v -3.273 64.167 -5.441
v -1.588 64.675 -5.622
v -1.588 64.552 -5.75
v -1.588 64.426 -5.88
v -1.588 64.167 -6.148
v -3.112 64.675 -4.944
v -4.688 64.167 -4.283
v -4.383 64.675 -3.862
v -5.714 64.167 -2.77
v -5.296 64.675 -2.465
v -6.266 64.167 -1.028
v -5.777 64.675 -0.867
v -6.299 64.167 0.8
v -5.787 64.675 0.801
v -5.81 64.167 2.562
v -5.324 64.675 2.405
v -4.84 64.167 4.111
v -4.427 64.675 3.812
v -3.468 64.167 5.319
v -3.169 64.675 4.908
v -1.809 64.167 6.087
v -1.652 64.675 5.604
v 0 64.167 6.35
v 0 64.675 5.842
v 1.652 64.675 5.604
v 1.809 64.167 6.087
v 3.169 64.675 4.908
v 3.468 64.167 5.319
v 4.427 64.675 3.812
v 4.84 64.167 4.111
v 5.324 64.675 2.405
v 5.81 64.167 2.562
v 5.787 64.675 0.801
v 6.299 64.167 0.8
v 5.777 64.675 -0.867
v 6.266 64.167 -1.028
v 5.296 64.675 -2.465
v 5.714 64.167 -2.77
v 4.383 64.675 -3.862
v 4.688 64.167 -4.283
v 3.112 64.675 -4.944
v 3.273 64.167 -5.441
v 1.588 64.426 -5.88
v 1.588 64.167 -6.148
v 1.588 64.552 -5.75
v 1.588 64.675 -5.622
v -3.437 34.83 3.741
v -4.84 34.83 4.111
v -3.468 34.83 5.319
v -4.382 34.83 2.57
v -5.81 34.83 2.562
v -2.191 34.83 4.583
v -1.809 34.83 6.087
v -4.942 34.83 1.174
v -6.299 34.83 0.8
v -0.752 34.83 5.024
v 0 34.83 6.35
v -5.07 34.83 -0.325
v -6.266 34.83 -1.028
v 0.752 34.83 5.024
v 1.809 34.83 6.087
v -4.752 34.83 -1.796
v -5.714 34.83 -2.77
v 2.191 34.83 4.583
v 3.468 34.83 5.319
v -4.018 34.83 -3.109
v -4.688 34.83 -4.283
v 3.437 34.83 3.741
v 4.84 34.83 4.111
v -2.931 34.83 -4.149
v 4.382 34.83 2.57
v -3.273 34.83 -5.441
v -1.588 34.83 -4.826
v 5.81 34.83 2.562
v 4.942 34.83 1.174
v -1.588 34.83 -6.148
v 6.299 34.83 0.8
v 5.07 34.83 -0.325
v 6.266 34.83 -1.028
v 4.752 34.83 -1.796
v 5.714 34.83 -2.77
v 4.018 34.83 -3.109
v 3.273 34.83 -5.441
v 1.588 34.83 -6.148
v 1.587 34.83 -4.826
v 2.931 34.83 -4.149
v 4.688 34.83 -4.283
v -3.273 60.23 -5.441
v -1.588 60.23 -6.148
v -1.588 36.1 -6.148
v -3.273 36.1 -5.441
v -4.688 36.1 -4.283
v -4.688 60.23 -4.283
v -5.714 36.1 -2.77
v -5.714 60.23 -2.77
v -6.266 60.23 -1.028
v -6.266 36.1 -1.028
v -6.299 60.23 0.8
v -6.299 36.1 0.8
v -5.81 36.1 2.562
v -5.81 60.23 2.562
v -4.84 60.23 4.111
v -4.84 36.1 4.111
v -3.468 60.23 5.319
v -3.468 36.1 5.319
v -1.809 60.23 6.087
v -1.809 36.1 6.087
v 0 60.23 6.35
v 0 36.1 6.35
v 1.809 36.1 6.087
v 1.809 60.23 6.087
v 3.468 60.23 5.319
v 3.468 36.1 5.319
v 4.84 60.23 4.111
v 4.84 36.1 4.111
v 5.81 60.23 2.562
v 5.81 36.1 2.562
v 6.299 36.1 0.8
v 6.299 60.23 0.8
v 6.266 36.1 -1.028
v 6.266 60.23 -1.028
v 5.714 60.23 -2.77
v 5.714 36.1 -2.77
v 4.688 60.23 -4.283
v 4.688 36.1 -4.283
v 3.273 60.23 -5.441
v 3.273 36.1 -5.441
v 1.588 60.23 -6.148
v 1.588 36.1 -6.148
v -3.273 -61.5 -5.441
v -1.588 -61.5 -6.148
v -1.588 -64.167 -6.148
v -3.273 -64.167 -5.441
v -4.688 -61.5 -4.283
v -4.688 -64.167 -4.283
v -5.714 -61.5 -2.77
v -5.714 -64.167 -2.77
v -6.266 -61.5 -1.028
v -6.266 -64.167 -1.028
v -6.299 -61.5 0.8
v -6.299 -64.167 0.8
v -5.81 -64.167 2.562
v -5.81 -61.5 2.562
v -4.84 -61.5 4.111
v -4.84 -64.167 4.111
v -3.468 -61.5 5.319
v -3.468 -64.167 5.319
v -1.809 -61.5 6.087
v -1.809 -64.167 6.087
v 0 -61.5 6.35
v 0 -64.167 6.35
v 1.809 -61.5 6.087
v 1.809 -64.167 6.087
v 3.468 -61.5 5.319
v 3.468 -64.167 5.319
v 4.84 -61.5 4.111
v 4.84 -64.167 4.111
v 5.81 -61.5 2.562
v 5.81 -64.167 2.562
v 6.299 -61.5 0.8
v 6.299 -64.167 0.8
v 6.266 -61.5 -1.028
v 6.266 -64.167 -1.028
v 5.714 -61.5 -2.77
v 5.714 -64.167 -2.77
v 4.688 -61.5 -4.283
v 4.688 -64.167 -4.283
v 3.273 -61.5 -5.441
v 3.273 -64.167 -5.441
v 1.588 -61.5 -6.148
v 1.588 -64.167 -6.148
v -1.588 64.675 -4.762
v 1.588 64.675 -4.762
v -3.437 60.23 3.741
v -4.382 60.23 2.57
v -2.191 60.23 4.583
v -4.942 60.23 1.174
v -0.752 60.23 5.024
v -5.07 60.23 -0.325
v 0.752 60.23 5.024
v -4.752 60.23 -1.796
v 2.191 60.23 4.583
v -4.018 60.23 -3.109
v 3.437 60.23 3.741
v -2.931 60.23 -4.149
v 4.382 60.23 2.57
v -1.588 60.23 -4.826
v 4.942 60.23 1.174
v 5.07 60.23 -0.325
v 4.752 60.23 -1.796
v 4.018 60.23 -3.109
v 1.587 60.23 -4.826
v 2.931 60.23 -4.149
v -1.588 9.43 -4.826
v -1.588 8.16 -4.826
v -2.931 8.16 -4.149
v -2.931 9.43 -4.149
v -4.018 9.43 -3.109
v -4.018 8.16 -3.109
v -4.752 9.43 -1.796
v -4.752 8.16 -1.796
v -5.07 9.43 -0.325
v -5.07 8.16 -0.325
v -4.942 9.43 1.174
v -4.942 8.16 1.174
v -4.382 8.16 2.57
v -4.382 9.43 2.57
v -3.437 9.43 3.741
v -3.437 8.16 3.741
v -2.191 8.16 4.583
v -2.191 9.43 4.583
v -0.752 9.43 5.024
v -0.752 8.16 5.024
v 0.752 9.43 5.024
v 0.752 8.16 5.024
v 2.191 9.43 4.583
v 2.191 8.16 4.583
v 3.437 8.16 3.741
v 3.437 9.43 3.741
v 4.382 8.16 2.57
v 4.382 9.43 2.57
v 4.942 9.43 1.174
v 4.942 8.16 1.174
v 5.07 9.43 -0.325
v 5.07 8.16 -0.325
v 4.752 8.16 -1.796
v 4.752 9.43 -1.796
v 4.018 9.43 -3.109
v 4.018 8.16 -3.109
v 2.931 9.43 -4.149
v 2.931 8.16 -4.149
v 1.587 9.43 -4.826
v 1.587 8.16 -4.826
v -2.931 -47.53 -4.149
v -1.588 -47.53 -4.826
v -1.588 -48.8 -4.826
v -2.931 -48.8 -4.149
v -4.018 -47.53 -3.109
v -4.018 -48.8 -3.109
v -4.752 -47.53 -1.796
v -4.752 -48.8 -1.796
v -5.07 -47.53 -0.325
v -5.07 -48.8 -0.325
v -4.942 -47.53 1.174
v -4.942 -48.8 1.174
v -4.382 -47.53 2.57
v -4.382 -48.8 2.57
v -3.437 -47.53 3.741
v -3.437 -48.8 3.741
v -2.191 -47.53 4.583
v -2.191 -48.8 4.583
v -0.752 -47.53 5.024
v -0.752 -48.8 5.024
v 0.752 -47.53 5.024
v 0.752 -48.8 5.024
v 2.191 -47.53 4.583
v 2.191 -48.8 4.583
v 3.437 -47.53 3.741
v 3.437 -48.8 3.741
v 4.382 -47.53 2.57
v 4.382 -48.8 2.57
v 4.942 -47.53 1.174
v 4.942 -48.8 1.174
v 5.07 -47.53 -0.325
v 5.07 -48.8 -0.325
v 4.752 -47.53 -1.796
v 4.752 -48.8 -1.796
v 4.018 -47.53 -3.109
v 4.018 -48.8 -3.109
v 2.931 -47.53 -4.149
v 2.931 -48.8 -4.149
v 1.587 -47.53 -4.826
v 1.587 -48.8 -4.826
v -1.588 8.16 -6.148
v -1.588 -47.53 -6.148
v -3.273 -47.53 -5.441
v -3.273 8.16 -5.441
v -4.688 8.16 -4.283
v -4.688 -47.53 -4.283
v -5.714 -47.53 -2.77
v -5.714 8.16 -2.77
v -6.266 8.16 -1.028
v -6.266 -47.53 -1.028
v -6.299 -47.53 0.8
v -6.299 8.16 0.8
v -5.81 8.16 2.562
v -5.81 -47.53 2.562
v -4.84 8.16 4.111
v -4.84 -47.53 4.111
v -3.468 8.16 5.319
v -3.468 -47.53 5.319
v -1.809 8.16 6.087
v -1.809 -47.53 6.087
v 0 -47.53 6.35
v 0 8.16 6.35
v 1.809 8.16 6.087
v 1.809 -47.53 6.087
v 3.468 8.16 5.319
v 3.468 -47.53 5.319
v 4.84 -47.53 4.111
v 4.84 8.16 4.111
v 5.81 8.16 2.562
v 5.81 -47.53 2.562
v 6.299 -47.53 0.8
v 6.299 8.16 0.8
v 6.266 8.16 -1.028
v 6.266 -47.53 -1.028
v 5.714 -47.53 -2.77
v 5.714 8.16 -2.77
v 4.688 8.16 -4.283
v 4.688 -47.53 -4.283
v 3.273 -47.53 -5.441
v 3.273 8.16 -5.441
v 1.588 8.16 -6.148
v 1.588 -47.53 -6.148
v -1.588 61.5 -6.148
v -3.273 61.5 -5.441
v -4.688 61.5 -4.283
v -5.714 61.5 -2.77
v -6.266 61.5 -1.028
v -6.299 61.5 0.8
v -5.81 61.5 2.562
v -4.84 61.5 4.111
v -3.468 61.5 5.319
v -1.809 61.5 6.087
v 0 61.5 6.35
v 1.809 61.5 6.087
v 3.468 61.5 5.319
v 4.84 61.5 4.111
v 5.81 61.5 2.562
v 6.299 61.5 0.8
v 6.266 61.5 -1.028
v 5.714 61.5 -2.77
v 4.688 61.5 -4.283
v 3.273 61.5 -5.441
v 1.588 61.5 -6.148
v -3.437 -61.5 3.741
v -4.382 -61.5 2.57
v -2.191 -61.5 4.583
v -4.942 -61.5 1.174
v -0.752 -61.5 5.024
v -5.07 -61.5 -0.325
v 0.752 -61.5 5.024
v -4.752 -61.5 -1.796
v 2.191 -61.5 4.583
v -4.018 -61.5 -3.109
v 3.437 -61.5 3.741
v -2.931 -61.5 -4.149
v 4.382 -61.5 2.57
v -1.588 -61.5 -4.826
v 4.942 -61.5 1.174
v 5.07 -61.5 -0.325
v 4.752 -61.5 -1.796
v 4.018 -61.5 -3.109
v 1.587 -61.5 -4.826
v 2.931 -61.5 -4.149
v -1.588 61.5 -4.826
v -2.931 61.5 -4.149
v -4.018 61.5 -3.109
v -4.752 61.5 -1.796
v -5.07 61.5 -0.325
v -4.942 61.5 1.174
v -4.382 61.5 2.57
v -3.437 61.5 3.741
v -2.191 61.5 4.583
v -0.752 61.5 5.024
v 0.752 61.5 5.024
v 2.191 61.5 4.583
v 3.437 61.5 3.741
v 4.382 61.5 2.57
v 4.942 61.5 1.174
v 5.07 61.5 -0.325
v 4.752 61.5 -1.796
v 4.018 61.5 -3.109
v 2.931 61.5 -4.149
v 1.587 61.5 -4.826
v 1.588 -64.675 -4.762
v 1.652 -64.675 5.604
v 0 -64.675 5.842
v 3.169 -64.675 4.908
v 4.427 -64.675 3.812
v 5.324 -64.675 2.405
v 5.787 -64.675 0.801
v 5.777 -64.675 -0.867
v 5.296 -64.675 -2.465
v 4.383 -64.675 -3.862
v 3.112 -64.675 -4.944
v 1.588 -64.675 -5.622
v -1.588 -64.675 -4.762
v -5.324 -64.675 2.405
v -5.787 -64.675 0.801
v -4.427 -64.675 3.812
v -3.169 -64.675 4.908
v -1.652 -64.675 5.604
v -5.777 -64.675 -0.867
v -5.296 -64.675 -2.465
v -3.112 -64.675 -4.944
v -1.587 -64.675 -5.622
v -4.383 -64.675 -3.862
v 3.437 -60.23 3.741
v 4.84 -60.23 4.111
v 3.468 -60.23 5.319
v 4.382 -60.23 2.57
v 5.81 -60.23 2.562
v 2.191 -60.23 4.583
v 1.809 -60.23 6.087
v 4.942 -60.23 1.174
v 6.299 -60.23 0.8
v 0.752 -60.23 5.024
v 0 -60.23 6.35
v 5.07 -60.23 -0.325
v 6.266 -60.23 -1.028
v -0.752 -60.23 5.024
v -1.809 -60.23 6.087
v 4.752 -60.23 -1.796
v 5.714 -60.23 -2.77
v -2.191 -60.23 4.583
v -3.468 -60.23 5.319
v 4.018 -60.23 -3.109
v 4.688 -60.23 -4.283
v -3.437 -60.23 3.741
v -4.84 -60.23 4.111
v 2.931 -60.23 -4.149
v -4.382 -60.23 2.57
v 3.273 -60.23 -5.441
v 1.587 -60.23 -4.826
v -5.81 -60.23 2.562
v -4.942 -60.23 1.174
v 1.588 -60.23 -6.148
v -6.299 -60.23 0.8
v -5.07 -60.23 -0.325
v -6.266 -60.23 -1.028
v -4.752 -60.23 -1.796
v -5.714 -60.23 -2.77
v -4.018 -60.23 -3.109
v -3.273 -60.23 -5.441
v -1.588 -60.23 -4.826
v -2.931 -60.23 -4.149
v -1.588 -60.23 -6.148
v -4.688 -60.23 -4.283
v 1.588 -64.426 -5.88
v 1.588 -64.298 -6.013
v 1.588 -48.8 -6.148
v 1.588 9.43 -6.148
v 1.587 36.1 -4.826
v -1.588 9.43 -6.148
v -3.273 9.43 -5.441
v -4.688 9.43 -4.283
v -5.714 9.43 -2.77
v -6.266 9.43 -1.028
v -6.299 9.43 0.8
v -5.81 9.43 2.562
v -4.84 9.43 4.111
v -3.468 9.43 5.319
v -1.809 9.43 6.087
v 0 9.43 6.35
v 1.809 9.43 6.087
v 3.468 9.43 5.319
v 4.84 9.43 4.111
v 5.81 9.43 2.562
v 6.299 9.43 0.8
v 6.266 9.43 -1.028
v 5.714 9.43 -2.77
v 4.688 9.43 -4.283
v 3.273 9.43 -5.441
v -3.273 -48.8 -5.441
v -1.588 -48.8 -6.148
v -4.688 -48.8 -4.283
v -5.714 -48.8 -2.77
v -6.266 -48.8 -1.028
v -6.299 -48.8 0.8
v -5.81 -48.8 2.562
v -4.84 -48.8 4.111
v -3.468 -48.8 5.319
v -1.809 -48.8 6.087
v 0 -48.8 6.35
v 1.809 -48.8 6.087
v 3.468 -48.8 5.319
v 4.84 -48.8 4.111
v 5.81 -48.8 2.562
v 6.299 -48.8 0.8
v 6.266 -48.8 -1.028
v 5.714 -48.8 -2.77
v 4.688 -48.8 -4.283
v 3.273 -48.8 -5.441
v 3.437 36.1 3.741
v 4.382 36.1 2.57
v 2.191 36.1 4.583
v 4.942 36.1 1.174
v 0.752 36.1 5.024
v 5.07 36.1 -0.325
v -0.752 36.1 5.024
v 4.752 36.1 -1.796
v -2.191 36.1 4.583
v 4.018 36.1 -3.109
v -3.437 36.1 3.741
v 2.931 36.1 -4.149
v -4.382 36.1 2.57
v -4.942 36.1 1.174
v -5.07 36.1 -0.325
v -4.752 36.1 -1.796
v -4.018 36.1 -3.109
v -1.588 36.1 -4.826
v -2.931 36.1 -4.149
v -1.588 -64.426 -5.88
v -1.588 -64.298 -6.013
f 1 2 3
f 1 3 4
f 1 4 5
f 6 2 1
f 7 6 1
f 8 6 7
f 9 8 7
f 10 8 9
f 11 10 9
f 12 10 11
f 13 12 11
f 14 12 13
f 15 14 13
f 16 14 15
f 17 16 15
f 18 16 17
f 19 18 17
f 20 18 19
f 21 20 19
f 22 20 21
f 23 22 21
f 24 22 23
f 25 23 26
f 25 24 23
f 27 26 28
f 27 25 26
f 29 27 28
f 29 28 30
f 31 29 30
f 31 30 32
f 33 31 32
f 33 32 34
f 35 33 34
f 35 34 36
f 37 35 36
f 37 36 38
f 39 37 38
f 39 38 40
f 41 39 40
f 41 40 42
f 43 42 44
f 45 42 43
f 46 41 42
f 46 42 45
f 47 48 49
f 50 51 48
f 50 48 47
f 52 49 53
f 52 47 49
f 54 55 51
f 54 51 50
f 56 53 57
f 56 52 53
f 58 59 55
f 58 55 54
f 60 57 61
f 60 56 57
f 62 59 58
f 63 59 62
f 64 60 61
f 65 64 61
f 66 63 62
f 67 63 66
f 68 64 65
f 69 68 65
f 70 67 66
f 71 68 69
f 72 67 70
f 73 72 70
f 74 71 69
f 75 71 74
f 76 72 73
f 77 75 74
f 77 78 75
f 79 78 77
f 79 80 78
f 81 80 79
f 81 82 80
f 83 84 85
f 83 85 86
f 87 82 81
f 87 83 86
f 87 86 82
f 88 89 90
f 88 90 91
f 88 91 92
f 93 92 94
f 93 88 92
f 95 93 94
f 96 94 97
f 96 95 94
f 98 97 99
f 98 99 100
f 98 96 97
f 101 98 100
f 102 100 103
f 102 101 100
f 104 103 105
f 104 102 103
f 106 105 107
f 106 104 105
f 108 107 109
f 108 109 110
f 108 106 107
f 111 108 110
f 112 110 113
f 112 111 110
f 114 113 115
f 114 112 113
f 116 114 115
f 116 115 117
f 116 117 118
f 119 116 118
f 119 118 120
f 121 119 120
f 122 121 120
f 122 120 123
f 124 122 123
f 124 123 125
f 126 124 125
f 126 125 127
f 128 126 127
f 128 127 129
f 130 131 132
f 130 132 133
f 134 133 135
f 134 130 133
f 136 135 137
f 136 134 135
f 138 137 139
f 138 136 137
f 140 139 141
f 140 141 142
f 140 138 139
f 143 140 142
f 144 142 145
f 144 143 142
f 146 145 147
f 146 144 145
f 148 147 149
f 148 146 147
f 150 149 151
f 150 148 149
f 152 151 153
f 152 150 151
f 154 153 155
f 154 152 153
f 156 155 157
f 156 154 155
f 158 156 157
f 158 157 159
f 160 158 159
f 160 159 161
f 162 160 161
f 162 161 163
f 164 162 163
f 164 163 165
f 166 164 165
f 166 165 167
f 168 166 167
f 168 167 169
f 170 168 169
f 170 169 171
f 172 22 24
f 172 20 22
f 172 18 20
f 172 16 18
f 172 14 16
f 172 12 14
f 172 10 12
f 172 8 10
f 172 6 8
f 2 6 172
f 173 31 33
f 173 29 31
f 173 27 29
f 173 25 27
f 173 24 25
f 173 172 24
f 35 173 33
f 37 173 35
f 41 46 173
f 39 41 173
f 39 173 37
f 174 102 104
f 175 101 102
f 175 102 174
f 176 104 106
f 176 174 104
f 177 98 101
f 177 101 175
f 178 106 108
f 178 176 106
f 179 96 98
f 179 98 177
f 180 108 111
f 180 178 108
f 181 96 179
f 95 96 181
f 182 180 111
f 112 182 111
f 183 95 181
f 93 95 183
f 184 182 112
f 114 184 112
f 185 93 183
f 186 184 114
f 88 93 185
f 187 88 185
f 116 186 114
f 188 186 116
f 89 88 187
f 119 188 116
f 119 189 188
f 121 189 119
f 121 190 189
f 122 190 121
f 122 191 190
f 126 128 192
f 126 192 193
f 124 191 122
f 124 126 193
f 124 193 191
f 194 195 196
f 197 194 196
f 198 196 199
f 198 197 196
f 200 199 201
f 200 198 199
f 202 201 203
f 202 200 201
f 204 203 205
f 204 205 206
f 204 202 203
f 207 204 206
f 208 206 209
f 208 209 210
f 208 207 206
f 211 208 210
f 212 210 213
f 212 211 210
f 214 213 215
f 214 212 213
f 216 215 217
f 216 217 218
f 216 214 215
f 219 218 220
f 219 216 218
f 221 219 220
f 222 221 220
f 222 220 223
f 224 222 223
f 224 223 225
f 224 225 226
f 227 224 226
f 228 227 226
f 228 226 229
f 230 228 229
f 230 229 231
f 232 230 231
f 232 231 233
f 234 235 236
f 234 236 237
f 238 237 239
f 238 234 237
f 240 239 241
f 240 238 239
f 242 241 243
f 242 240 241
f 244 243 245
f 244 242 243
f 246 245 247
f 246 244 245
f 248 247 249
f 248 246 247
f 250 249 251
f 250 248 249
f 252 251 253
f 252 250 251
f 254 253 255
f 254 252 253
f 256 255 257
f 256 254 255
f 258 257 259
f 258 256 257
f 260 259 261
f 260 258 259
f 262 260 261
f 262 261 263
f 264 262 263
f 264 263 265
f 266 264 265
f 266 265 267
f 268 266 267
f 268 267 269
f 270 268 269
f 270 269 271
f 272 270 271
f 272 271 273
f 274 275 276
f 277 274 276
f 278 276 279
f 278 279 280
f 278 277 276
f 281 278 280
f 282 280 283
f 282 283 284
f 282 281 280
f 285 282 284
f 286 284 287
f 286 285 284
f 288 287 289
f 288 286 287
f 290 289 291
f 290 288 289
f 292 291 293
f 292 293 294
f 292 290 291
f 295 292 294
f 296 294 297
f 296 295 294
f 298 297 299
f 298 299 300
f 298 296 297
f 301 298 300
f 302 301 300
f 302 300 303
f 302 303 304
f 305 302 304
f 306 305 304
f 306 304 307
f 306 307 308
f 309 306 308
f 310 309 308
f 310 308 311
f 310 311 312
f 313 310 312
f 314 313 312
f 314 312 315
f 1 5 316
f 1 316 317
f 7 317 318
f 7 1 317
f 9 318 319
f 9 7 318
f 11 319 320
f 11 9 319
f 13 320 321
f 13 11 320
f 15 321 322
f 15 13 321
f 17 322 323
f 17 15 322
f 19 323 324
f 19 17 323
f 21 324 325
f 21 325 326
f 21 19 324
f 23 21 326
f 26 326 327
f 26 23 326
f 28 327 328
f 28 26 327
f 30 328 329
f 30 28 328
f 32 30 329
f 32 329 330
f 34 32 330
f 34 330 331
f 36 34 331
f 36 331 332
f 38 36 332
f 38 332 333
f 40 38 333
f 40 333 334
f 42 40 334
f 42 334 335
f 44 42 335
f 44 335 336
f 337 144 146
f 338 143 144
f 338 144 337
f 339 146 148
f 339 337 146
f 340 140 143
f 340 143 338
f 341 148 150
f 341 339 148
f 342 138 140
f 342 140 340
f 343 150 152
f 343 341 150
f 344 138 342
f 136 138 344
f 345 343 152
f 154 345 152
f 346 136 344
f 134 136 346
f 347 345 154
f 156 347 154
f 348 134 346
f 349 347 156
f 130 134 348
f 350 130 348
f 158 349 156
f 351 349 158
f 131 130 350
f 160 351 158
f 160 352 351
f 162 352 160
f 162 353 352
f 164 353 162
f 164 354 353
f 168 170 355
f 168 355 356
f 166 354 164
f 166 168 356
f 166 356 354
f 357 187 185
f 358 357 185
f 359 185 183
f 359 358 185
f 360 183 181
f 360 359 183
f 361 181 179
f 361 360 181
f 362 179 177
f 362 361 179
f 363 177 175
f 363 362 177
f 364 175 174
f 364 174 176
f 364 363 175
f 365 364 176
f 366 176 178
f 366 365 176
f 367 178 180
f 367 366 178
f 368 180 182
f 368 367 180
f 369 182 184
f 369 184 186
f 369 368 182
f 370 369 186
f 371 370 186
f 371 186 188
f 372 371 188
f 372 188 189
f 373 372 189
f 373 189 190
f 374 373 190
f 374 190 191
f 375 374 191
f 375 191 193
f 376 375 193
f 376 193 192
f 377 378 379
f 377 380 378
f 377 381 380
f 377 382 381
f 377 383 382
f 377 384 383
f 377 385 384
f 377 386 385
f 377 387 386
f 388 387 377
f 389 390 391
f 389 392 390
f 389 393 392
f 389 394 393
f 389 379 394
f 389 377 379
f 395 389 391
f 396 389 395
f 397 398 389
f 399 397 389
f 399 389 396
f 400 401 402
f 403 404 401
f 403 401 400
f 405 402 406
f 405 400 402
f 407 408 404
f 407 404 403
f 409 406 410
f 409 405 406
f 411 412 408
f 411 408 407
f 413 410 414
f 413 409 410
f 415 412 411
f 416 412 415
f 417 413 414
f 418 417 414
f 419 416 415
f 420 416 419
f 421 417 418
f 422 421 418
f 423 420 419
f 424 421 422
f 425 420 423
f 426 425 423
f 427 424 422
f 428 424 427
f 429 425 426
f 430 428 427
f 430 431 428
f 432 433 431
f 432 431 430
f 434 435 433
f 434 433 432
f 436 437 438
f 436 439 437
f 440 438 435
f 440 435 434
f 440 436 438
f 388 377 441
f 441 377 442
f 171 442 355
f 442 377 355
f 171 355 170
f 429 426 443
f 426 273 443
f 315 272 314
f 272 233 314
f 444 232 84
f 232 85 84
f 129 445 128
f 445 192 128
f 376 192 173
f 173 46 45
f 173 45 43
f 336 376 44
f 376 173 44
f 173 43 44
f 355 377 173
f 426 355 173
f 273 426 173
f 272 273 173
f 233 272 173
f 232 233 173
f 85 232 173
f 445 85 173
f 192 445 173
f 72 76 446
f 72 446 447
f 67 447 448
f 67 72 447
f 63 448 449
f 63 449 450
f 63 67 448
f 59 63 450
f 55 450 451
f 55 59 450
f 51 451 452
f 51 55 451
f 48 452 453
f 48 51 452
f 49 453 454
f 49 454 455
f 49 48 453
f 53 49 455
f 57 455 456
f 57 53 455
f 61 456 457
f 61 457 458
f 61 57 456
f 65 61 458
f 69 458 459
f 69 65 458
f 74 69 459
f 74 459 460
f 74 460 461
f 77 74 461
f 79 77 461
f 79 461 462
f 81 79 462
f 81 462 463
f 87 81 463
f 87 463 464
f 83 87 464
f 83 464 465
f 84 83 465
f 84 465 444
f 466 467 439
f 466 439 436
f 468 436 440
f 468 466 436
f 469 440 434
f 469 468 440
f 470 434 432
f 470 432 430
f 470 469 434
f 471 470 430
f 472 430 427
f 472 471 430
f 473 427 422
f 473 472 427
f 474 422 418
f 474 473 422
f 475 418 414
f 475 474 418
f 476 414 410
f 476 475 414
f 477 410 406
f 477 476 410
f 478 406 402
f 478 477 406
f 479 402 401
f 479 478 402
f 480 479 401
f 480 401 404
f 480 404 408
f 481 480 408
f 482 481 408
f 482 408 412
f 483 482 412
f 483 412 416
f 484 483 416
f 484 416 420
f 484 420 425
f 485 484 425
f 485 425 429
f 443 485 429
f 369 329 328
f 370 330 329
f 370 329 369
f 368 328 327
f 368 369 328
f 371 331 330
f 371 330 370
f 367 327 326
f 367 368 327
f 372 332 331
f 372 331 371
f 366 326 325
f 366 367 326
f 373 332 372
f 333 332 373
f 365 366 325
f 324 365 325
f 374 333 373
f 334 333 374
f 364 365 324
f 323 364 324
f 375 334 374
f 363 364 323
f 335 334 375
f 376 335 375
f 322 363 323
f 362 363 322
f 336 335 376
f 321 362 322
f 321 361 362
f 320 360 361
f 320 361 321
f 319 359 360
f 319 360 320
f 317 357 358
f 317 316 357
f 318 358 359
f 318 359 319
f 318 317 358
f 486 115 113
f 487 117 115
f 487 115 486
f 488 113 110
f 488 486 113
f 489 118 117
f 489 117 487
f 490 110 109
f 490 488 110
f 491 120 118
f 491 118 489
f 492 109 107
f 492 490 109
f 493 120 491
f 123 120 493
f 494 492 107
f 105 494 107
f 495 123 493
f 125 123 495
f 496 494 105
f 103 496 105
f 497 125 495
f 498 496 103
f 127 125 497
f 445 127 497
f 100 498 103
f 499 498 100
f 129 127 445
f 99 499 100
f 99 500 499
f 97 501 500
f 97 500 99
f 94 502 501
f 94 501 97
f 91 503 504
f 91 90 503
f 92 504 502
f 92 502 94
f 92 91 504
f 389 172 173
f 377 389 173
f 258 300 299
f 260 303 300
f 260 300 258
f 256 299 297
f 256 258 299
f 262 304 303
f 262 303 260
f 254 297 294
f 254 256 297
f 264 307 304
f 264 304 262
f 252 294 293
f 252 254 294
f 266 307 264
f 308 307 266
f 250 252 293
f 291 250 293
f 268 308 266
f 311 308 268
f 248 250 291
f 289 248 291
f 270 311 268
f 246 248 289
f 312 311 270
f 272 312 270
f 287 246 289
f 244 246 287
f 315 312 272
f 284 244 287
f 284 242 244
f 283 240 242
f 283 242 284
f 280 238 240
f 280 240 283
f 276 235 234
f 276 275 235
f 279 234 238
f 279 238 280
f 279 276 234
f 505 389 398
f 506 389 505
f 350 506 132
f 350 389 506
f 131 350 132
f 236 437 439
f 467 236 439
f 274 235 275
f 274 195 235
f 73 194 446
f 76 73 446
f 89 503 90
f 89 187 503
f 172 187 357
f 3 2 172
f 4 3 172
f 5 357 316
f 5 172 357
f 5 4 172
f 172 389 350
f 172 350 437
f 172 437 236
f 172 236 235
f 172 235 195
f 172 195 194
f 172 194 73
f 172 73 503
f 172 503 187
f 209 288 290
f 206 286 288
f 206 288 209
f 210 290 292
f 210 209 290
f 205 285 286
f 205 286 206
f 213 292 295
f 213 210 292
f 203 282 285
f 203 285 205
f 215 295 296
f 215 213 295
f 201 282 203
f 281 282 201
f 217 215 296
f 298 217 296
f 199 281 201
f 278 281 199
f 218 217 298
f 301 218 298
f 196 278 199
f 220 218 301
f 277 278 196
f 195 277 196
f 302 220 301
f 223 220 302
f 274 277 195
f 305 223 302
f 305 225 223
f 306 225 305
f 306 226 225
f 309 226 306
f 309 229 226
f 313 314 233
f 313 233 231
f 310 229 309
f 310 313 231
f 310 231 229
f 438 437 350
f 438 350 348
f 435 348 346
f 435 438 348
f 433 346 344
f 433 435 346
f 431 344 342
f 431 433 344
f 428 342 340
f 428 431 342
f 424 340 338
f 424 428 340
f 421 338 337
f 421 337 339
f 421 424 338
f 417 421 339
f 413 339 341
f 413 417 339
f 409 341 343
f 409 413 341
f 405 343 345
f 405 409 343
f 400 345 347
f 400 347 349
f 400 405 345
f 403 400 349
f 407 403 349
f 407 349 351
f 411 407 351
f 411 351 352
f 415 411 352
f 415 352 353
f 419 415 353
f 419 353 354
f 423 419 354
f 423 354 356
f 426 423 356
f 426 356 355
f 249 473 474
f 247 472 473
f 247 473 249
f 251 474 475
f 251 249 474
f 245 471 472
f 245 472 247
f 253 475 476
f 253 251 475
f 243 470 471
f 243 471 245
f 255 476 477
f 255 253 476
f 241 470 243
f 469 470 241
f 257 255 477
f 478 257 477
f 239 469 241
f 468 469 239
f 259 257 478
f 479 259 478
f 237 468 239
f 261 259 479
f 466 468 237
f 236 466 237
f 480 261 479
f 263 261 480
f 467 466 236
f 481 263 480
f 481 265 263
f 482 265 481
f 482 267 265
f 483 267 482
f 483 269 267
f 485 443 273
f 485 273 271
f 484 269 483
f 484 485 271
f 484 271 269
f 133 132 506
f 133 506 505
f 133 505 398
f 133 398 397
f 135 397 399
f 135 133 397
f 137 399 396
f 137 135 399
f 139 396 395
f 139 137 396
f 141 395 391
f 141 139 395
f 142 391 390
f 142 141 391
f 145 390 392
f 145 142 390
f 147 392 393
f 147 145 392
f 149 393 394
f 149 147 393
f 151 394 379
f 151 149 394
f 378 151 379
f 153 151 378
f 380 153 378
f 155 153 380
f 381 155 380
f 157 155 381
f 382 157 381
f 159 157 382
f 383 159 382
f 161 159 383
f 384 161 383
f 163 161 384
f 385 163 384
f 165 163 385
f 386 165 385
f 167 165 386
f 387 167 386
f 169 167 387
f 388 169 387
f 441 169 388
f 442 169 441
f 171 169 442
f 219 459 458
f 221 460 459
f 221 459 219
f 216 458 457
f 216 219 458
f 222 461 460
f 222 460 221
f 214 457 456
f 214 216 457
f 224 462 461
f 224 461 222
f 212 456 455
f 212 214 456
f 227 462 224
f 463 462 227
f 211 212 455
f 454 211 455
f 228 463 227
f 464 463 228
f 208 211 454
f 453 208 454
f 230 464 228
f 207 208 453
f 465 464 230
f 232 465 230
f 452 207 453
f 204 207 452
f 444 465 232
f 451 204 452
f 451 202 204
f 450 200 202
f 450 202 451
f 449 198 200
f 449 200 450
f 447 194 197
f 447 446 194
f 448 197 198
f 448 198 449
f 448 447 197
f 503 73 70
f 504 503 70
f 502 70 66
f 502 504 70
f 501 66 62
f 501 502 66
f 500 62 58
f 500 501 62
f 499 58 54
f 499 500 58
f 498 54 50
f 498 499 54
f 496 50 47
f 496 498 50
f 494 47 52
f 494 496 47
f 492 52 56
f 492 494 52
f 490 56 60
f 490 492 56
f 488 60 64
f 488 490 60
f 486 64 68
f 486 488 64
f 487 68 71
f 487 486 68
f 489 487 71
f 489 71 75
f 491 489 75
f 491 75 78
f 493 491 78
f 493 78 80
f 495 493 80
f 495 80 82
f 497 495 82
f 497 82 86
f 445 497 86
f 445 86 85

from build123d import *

# Parameters (mm, degrees)
SKETCH2_W          = 3.175
SKETCH2_H          = 1.5875
CUT_EXTRUDE1_DEPTH = 130.660858204


with BuildPart() as part:
    # Sketch1 → Revolve1 (revolve)
    with BuildSketch(Plane.XY):
        Polygon((6.35, 64.16675), (5.842, 64.67475), (0, 64.67475), (0, -64.67475), (5.842, -64.67475), (6.35, -64.16675), (6.35, -61.49975), (5.08, -61.49975), (5.08, -60.22975), (6.35, -60.22975), (6.35, -48.79975), (5.08, -48.79975), (5.08, -47.52975), (6.35, -47.52975), (6.35, 8.15975), (5.08, 8.15975), (5.08, 9.42975), (6.35, 9.42975), (6.35, 34.82975), (5.08, 34.82975), (5.08, 36.09975), (6.35, 36.09975), (6.35, 60.22975), (5.08, 60.22975), (5.08, 61.49975), (6.35, 61.49975), align=None)
    revolve(axis=Axis((0, -64.67475, 0), (0, 1, 0)))

    # Sketch2 → Cut-Extrude1 (cut, through all)
    with BuildSketch(Plane(origin=(0, 64.67475, 0), x_dir=(1, 0, 0), z_dir=(0, 1, 0))):
        with Locations((0, 5.55625)):
            Rectangle(SKETCH2_W, SKETCH2_H)
    extrude(amount=-CUT_EXTRUDE1_DEPTH, mode=Mode.SUBTRACT)


solid = part.part
